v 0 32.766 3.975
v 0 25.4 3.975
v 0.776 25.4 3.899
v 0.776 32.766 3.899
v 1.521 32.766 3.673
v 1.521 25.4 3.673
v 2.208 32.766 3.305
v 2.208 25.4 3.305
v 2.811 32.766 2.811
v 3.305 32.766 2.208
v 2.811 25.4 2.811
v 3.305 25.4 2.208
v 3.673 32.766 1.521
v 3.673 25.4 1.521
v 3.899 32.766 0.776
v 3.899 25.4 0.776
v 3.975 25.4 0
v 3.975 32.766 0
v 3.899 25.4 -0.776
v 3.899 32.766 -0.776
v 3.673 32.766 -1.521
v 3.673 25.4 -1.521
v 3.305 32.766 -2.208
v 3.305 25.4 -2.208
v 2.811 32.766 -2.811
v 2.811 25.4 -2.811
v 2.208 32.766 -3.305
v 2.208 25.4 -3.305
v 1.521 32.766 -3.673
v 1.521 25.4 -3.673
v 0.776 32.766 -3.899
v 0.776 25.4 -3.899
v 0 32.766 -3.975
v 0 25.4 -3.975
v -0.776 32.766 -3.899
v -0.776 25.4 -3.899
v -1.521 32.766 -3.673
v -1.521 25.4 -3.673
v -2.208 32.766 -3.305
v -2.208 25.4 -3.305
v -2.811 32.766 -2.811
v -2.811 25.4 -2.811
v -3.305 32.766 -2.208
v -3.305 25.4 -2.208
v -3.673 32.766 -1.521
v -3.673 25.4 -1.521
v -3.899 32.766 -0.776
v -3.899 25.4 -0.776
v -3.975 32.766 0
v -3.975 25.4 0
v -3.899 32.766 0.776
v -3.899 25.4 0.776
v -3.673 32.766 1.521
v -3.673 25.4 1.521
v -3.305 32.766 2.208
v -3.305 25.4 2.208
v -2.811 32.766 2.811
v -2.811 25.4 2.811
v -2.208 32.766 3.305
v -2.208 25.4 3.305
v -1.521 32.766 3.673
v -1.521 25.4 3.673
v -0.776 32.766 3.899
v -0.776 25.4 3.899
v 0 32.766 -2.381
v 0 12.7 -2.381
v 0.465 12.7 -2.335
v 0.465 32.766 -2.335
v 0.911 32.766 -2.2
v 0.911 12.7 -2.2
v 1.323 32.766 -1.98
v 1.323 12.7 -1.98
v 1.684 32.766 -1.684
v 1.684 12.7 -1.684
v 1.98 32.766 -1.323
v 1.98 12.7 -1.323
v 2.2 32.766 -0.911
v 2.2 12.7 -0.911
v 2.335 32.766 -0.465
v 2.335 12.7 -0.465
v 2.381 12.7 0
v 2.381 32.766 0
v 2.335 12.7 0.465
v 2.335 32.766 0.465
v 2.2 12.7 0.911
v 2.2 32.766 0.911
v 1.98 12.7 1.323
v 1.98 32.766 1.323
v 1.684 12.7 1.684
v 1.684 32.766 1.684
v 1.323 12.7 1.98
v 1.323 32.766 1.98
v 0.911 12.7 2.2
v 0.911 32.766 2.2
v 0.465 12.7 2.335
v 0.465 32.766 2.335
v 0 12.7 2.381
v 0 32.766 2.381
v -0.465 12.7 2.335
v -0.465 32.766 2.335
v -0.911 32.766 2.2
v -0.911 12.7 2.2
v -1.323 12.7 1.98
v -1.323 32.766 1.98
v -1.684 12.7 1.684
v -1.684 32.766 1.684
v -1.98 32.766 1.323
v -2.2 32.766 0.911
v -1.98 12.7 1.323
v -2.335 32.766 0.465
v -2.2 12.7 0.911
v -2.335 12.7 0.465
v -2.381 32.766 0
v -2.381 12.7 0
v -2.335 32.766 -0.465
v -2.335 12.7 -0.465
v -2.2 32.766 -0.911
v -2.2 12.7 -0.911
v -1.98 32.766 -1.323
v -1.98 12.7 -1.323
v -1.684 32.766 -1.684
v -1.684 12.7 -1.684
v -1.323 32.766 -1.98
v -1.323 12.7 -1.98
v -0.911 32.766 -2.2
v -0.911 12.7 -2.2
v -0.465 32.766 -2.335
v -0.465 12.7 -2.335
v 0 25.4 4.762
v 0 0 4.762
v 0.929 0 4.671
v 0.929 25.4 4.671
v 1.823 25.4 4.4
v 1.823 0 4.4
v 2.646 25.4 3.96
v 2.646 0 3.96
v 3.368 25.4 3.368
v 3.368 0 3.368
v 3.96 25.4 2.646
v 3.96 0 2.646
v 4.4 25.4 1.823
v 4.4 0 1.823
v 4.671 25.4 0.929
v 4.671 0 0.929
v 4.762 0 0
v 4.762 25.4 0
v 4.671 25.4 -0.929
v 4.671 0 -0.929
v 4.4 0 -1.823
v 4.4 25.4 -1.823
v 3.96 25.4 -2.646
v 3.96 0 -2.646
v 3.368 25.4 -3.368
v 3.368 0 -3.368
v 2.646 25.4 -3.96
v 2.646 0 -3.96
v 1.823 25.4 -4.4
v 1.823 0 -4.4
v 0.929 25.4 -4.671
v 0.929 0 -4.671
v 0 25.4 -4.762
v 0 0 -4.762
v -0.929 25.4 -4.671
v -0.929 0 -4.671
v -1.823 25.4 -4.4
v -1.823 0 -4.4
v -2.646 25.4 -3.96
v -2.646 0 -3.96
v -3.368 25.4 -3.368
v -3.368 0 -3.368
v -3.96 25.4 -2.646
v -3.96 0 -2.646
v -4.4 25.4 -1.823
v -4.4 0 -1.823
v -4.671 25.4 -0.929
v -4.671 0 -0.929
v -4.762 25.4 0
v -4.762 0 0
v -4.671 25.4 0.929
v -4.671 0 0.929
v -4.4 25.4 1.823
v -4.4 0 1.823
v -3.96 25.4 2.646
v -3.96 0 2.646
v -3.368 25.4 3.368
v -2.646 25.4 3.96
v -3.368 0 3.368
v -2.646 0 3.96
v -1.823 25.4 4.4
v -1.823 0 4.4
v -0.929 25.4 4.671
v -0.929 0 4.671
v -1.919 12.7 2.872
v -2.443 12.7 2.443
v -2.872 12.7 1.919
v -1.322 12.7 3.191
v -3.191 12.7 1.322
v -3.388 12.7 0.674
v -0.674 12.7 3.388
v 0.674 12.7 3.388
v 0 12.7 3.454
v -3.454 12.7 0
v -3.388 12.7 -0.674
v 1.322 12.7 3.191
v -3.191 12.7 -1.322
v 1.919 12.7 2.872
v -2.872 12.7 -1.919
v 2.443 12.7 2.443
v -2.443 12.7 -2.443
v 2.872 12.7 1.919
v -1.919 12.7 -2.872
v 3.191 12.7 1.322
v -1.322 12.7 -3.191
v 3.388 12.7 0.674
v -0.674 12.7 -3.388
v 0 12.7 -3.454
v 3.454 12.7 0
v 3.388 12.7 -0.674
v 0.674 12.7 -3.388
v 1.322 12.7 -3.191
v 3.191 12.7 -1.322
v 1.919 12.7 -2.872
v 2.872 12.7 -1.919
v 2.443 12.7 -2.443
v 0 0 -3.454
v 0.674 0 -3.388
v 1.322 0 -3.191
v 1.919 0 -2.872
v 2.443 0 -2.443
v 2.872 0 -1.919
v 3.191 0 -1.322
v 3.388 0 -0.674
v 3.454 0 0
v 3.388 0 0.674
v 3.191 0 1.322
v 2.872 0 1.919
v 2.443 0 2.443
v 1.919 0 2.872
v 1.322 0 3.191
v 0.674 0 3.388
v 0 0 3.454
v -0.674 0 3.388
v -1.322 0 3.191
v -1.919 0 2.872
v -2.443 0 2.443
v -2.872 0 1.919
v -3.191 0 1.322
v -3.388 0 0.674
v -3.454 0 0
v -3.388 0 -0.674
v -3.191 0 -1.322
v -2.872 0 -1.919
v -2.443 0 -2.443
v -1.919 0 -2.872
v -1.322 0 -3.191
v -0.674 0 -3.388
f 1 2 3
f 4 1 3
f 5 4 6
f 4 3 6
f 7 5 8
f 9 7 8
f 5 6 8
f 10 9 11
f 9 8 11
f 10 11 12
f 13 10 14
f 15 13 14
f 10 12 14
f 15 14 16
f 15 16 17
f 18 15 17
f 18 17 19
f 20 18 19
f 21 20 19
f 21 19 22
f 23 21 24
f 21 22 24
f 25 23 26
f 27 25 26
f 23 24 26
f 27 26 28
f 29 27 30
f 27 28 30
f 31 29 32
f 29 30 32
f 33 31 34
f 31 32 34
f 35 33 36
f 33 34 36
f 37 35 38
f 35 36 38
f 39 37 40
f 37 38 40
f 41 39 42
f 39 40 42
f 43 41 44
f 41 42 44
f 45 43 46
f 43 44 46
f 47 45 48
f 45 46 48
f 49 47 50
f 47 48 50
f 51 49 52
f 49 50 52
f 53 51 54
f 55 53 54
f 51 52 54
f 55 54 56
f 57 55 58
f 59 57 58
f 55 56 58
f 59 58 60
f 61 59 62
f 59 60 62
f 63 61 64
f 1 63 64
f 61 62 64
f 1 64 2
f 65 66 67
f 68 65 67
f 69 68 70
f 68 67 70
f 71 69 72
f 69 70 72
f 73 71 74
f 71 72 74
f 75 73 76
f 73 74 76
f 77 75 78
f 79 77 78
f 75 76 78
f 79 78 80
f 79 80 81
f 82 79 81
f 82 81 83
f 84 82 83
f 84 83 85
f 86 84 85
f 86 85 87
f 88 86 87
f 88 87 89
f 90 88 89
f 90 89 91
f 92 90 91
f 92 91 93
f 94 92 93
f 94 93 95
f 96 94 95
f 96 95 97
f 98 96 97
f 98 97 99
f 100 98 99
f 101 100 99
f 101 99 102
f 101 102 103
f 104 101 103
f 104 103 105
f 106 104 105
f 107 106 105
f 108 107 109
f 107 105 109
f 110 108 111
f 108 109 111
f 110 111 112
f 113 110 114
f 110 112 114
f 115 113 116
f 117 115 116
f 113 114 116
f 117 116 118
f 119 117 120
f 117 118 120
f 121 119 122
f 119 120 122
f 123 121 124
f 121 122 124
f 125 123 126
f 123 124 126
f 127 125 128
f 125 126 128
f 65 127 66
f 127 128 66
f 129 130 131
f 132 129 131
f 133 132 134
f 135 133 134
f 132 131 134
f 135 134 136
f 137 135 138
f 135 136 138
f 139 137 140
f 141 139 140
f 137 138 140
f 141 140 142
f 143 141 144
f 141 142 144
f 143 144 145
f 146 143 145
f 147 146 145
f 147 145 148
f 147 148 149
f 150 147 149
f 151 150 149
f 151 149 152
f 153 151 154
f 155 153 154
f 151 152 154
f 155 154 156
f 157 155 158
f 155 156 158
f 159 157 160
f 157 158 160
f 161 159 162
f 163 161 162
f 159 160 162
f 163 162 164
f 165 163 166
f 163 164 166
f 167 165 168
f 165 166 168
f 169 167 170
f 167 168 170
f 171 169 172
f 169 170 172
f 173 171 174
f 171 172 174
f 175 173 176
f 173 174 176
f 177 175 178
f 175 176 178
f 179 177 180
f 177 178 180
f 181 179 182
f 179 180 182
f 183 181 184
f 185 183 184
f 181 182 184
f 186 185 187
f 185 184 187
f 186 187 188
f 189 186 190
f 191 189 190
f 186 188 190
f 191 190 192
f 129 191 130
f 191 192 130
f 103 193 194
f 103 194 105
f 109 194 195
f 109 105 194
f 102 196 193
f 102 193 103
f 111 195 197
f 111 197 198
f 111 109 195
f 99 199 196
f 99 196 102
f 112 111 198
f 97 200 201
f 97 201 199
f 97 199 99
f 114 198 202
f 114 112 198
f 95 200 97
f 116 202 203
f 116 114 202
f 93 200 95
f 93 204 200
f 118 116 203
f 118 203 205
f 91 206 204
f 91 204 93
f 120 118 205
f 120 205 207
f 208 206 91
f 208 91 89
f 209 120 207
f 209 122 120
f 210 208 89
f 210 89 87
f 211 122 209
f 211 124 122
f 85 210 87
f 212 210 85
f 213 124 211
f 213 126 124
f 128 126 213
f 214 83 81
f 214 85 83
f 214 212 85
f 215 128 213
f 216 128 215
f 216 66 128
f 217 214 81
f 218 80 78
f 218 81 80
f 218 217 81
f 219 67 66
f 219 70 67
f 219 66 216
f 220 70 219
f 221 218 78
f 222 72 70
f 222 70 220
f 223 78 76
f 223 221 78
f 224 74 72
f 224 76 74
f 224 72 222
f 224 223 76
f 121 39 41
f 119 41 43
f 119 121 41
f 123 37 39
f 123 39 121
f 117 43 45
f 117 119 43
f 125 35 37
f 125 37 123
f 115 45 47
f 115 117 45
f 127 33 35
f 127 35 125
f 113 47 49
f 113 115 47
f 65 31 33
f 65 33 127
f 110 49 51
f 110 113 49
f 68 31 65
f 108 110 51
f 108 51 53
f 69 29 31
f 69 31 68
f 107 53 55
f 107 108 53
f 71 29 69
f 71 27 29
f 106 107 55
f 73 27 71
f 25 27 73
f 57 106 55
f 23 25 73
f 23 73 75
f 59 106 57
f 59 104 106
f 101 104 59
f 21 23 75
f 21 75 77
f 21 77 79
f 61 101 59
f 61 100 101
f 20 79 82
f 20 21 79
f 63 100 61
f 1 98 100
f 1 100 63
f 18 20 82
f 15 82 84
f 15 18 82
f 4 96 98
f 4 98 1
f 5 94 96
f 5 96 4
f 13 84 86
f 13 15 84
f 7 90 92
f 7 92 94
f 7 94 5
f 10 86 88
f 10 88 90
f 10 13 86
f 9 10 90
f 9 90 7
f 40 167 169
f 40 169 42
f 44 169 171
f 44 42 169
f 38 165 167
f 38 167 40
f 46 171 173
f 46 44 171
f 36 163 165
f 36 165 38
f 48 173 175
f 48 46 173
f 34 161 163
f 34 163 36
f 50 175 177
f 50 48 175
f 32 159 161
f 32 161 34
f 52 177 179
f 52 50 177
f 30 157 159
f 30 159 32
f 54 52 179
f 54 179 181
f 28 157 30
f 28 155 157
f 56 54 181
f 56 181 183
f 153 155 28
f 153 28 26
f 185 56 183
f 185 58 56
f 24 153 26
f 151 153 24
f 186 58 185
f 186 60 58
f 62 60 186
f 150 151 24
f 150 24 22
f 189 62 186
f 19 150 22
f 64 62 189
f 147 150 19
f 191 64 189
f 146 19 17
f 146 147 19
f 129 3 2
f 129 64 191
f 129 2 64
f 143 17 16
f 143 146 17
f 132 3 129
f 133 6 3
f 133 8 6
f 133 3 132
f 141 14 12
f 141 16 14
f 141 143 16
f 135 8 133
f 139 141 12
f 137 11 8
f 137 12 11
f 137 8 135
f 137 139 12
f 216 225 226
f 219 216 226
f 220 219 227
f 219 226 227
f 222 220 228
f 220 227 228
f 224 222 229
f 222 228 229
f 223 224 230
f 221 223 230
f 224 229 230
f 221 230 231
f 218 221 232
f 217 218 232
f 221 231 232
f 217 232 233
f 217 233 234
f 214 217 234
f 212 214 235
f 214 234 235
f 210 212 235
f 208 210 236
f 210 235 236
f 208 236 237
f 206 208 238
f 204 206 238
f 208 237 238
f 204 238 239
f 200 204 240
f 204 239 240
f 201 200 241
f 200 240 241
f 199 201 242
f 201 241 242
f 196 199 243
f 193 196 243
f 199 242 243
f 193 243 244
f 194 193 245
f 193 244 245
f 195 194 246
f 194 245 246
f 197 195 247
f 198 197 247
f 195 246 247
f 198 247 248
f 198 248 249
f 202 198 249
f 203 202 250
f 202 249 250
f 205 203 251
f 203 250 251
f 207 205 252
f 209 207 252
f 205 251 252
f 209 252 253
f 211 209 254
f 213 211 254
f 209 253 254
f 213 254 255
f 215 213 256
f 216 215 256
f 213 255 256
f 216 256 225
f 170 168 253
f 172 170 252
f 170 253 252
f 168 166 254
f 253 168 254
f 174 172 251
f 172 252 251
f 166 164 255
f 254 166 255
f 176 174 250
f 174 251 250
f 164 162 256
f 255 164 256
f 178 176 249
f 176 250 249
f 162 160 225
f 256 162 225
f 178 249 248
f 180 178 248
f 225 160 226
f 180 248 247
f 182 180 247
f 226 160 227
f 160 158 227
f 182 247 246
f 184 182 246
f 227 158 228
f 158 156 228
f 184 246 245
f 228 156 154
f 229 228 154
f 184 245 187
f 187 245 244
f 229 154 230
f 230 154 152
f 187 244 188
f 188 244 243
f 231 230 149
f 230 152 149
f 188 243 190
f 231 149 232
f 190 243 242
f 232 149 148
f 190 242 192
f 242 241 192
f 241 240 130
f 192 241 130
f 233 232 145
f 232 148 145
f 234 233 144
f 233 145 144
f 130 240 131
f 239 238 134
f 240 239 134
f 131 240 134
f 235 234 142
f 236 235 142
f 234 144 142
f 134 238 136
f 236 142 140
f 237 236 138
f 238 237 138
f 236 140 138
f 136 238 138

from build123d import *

# Parameters (mm, degrees)
SKETCH1_R           = 4.7625
BOSS_EXTRUDE1_DEPTH = 25.4
SKETCH2_R           = 3.9751
BOSS_EXTRUDE2_DEPTH = 7.366
SKETCH3_R           = 2.38125
CUT_EXTRUDE1_DEPTH  = 33.766
SKETCH4_R           = 3.4544
CUT_EXTRUDE2_DEPTH  = 12.7


with BuildPart() as part:
    # Sketch1 → Boss-Extrude1 (new body)
    with BuildSketch(Plane(origin=(0, 0, 0), x_dir=(1, 0, 0), z_dir=(0, 1, 0))):
        with Locations(Location((0, 0, 0), (0, 0, 270))):  # turned: the seam where the file's is
            Circle(SKETCH1_R)
    extrude(amount=BOSS_EXTRUDE1_DEPTH)

    # Sketch2 → Boss-Extrude2 (add)
    with BuildSketch(Plane(origin=(0, 25.4, 0), x_dir=(1, 0, 0), z_dir=(0, 1, 0))):
        with Locations(Location((0, 0, 0), (0, 0, 270))):  # turned: the seam where the file's is
            Circle(SKETCH2_R)
    extrude(amount=BOSS_EXTRUDE2_DEPTH)

    # Sketch3 → Cut-Extrude1 (cut, through all)
    with BuildSketch(Plane.XZ):
        with Locations(Location((0, 0, 0), (0, 0, 270))):  # turned: the seam where the file's is
            Circle(SKETCH3_R)
    extrude(amount=-CUT_EXTRUDE1_DEPTH, mode=Mode.SUBTRACT)

    # Sketch4 → Cut-Extrude2 (cut)
    with BuildSketch(Plane.XZ):
        with Locations(Location((0, 0, 0), (0, 0, 270))):  # turned: the seam where the file's is
            Circle(SKETCH4_R)
    extrude(amount=-CUT_EXTRUDE2_DEPTH, mode=Mode.SUBTRACT)


solid = part.part
